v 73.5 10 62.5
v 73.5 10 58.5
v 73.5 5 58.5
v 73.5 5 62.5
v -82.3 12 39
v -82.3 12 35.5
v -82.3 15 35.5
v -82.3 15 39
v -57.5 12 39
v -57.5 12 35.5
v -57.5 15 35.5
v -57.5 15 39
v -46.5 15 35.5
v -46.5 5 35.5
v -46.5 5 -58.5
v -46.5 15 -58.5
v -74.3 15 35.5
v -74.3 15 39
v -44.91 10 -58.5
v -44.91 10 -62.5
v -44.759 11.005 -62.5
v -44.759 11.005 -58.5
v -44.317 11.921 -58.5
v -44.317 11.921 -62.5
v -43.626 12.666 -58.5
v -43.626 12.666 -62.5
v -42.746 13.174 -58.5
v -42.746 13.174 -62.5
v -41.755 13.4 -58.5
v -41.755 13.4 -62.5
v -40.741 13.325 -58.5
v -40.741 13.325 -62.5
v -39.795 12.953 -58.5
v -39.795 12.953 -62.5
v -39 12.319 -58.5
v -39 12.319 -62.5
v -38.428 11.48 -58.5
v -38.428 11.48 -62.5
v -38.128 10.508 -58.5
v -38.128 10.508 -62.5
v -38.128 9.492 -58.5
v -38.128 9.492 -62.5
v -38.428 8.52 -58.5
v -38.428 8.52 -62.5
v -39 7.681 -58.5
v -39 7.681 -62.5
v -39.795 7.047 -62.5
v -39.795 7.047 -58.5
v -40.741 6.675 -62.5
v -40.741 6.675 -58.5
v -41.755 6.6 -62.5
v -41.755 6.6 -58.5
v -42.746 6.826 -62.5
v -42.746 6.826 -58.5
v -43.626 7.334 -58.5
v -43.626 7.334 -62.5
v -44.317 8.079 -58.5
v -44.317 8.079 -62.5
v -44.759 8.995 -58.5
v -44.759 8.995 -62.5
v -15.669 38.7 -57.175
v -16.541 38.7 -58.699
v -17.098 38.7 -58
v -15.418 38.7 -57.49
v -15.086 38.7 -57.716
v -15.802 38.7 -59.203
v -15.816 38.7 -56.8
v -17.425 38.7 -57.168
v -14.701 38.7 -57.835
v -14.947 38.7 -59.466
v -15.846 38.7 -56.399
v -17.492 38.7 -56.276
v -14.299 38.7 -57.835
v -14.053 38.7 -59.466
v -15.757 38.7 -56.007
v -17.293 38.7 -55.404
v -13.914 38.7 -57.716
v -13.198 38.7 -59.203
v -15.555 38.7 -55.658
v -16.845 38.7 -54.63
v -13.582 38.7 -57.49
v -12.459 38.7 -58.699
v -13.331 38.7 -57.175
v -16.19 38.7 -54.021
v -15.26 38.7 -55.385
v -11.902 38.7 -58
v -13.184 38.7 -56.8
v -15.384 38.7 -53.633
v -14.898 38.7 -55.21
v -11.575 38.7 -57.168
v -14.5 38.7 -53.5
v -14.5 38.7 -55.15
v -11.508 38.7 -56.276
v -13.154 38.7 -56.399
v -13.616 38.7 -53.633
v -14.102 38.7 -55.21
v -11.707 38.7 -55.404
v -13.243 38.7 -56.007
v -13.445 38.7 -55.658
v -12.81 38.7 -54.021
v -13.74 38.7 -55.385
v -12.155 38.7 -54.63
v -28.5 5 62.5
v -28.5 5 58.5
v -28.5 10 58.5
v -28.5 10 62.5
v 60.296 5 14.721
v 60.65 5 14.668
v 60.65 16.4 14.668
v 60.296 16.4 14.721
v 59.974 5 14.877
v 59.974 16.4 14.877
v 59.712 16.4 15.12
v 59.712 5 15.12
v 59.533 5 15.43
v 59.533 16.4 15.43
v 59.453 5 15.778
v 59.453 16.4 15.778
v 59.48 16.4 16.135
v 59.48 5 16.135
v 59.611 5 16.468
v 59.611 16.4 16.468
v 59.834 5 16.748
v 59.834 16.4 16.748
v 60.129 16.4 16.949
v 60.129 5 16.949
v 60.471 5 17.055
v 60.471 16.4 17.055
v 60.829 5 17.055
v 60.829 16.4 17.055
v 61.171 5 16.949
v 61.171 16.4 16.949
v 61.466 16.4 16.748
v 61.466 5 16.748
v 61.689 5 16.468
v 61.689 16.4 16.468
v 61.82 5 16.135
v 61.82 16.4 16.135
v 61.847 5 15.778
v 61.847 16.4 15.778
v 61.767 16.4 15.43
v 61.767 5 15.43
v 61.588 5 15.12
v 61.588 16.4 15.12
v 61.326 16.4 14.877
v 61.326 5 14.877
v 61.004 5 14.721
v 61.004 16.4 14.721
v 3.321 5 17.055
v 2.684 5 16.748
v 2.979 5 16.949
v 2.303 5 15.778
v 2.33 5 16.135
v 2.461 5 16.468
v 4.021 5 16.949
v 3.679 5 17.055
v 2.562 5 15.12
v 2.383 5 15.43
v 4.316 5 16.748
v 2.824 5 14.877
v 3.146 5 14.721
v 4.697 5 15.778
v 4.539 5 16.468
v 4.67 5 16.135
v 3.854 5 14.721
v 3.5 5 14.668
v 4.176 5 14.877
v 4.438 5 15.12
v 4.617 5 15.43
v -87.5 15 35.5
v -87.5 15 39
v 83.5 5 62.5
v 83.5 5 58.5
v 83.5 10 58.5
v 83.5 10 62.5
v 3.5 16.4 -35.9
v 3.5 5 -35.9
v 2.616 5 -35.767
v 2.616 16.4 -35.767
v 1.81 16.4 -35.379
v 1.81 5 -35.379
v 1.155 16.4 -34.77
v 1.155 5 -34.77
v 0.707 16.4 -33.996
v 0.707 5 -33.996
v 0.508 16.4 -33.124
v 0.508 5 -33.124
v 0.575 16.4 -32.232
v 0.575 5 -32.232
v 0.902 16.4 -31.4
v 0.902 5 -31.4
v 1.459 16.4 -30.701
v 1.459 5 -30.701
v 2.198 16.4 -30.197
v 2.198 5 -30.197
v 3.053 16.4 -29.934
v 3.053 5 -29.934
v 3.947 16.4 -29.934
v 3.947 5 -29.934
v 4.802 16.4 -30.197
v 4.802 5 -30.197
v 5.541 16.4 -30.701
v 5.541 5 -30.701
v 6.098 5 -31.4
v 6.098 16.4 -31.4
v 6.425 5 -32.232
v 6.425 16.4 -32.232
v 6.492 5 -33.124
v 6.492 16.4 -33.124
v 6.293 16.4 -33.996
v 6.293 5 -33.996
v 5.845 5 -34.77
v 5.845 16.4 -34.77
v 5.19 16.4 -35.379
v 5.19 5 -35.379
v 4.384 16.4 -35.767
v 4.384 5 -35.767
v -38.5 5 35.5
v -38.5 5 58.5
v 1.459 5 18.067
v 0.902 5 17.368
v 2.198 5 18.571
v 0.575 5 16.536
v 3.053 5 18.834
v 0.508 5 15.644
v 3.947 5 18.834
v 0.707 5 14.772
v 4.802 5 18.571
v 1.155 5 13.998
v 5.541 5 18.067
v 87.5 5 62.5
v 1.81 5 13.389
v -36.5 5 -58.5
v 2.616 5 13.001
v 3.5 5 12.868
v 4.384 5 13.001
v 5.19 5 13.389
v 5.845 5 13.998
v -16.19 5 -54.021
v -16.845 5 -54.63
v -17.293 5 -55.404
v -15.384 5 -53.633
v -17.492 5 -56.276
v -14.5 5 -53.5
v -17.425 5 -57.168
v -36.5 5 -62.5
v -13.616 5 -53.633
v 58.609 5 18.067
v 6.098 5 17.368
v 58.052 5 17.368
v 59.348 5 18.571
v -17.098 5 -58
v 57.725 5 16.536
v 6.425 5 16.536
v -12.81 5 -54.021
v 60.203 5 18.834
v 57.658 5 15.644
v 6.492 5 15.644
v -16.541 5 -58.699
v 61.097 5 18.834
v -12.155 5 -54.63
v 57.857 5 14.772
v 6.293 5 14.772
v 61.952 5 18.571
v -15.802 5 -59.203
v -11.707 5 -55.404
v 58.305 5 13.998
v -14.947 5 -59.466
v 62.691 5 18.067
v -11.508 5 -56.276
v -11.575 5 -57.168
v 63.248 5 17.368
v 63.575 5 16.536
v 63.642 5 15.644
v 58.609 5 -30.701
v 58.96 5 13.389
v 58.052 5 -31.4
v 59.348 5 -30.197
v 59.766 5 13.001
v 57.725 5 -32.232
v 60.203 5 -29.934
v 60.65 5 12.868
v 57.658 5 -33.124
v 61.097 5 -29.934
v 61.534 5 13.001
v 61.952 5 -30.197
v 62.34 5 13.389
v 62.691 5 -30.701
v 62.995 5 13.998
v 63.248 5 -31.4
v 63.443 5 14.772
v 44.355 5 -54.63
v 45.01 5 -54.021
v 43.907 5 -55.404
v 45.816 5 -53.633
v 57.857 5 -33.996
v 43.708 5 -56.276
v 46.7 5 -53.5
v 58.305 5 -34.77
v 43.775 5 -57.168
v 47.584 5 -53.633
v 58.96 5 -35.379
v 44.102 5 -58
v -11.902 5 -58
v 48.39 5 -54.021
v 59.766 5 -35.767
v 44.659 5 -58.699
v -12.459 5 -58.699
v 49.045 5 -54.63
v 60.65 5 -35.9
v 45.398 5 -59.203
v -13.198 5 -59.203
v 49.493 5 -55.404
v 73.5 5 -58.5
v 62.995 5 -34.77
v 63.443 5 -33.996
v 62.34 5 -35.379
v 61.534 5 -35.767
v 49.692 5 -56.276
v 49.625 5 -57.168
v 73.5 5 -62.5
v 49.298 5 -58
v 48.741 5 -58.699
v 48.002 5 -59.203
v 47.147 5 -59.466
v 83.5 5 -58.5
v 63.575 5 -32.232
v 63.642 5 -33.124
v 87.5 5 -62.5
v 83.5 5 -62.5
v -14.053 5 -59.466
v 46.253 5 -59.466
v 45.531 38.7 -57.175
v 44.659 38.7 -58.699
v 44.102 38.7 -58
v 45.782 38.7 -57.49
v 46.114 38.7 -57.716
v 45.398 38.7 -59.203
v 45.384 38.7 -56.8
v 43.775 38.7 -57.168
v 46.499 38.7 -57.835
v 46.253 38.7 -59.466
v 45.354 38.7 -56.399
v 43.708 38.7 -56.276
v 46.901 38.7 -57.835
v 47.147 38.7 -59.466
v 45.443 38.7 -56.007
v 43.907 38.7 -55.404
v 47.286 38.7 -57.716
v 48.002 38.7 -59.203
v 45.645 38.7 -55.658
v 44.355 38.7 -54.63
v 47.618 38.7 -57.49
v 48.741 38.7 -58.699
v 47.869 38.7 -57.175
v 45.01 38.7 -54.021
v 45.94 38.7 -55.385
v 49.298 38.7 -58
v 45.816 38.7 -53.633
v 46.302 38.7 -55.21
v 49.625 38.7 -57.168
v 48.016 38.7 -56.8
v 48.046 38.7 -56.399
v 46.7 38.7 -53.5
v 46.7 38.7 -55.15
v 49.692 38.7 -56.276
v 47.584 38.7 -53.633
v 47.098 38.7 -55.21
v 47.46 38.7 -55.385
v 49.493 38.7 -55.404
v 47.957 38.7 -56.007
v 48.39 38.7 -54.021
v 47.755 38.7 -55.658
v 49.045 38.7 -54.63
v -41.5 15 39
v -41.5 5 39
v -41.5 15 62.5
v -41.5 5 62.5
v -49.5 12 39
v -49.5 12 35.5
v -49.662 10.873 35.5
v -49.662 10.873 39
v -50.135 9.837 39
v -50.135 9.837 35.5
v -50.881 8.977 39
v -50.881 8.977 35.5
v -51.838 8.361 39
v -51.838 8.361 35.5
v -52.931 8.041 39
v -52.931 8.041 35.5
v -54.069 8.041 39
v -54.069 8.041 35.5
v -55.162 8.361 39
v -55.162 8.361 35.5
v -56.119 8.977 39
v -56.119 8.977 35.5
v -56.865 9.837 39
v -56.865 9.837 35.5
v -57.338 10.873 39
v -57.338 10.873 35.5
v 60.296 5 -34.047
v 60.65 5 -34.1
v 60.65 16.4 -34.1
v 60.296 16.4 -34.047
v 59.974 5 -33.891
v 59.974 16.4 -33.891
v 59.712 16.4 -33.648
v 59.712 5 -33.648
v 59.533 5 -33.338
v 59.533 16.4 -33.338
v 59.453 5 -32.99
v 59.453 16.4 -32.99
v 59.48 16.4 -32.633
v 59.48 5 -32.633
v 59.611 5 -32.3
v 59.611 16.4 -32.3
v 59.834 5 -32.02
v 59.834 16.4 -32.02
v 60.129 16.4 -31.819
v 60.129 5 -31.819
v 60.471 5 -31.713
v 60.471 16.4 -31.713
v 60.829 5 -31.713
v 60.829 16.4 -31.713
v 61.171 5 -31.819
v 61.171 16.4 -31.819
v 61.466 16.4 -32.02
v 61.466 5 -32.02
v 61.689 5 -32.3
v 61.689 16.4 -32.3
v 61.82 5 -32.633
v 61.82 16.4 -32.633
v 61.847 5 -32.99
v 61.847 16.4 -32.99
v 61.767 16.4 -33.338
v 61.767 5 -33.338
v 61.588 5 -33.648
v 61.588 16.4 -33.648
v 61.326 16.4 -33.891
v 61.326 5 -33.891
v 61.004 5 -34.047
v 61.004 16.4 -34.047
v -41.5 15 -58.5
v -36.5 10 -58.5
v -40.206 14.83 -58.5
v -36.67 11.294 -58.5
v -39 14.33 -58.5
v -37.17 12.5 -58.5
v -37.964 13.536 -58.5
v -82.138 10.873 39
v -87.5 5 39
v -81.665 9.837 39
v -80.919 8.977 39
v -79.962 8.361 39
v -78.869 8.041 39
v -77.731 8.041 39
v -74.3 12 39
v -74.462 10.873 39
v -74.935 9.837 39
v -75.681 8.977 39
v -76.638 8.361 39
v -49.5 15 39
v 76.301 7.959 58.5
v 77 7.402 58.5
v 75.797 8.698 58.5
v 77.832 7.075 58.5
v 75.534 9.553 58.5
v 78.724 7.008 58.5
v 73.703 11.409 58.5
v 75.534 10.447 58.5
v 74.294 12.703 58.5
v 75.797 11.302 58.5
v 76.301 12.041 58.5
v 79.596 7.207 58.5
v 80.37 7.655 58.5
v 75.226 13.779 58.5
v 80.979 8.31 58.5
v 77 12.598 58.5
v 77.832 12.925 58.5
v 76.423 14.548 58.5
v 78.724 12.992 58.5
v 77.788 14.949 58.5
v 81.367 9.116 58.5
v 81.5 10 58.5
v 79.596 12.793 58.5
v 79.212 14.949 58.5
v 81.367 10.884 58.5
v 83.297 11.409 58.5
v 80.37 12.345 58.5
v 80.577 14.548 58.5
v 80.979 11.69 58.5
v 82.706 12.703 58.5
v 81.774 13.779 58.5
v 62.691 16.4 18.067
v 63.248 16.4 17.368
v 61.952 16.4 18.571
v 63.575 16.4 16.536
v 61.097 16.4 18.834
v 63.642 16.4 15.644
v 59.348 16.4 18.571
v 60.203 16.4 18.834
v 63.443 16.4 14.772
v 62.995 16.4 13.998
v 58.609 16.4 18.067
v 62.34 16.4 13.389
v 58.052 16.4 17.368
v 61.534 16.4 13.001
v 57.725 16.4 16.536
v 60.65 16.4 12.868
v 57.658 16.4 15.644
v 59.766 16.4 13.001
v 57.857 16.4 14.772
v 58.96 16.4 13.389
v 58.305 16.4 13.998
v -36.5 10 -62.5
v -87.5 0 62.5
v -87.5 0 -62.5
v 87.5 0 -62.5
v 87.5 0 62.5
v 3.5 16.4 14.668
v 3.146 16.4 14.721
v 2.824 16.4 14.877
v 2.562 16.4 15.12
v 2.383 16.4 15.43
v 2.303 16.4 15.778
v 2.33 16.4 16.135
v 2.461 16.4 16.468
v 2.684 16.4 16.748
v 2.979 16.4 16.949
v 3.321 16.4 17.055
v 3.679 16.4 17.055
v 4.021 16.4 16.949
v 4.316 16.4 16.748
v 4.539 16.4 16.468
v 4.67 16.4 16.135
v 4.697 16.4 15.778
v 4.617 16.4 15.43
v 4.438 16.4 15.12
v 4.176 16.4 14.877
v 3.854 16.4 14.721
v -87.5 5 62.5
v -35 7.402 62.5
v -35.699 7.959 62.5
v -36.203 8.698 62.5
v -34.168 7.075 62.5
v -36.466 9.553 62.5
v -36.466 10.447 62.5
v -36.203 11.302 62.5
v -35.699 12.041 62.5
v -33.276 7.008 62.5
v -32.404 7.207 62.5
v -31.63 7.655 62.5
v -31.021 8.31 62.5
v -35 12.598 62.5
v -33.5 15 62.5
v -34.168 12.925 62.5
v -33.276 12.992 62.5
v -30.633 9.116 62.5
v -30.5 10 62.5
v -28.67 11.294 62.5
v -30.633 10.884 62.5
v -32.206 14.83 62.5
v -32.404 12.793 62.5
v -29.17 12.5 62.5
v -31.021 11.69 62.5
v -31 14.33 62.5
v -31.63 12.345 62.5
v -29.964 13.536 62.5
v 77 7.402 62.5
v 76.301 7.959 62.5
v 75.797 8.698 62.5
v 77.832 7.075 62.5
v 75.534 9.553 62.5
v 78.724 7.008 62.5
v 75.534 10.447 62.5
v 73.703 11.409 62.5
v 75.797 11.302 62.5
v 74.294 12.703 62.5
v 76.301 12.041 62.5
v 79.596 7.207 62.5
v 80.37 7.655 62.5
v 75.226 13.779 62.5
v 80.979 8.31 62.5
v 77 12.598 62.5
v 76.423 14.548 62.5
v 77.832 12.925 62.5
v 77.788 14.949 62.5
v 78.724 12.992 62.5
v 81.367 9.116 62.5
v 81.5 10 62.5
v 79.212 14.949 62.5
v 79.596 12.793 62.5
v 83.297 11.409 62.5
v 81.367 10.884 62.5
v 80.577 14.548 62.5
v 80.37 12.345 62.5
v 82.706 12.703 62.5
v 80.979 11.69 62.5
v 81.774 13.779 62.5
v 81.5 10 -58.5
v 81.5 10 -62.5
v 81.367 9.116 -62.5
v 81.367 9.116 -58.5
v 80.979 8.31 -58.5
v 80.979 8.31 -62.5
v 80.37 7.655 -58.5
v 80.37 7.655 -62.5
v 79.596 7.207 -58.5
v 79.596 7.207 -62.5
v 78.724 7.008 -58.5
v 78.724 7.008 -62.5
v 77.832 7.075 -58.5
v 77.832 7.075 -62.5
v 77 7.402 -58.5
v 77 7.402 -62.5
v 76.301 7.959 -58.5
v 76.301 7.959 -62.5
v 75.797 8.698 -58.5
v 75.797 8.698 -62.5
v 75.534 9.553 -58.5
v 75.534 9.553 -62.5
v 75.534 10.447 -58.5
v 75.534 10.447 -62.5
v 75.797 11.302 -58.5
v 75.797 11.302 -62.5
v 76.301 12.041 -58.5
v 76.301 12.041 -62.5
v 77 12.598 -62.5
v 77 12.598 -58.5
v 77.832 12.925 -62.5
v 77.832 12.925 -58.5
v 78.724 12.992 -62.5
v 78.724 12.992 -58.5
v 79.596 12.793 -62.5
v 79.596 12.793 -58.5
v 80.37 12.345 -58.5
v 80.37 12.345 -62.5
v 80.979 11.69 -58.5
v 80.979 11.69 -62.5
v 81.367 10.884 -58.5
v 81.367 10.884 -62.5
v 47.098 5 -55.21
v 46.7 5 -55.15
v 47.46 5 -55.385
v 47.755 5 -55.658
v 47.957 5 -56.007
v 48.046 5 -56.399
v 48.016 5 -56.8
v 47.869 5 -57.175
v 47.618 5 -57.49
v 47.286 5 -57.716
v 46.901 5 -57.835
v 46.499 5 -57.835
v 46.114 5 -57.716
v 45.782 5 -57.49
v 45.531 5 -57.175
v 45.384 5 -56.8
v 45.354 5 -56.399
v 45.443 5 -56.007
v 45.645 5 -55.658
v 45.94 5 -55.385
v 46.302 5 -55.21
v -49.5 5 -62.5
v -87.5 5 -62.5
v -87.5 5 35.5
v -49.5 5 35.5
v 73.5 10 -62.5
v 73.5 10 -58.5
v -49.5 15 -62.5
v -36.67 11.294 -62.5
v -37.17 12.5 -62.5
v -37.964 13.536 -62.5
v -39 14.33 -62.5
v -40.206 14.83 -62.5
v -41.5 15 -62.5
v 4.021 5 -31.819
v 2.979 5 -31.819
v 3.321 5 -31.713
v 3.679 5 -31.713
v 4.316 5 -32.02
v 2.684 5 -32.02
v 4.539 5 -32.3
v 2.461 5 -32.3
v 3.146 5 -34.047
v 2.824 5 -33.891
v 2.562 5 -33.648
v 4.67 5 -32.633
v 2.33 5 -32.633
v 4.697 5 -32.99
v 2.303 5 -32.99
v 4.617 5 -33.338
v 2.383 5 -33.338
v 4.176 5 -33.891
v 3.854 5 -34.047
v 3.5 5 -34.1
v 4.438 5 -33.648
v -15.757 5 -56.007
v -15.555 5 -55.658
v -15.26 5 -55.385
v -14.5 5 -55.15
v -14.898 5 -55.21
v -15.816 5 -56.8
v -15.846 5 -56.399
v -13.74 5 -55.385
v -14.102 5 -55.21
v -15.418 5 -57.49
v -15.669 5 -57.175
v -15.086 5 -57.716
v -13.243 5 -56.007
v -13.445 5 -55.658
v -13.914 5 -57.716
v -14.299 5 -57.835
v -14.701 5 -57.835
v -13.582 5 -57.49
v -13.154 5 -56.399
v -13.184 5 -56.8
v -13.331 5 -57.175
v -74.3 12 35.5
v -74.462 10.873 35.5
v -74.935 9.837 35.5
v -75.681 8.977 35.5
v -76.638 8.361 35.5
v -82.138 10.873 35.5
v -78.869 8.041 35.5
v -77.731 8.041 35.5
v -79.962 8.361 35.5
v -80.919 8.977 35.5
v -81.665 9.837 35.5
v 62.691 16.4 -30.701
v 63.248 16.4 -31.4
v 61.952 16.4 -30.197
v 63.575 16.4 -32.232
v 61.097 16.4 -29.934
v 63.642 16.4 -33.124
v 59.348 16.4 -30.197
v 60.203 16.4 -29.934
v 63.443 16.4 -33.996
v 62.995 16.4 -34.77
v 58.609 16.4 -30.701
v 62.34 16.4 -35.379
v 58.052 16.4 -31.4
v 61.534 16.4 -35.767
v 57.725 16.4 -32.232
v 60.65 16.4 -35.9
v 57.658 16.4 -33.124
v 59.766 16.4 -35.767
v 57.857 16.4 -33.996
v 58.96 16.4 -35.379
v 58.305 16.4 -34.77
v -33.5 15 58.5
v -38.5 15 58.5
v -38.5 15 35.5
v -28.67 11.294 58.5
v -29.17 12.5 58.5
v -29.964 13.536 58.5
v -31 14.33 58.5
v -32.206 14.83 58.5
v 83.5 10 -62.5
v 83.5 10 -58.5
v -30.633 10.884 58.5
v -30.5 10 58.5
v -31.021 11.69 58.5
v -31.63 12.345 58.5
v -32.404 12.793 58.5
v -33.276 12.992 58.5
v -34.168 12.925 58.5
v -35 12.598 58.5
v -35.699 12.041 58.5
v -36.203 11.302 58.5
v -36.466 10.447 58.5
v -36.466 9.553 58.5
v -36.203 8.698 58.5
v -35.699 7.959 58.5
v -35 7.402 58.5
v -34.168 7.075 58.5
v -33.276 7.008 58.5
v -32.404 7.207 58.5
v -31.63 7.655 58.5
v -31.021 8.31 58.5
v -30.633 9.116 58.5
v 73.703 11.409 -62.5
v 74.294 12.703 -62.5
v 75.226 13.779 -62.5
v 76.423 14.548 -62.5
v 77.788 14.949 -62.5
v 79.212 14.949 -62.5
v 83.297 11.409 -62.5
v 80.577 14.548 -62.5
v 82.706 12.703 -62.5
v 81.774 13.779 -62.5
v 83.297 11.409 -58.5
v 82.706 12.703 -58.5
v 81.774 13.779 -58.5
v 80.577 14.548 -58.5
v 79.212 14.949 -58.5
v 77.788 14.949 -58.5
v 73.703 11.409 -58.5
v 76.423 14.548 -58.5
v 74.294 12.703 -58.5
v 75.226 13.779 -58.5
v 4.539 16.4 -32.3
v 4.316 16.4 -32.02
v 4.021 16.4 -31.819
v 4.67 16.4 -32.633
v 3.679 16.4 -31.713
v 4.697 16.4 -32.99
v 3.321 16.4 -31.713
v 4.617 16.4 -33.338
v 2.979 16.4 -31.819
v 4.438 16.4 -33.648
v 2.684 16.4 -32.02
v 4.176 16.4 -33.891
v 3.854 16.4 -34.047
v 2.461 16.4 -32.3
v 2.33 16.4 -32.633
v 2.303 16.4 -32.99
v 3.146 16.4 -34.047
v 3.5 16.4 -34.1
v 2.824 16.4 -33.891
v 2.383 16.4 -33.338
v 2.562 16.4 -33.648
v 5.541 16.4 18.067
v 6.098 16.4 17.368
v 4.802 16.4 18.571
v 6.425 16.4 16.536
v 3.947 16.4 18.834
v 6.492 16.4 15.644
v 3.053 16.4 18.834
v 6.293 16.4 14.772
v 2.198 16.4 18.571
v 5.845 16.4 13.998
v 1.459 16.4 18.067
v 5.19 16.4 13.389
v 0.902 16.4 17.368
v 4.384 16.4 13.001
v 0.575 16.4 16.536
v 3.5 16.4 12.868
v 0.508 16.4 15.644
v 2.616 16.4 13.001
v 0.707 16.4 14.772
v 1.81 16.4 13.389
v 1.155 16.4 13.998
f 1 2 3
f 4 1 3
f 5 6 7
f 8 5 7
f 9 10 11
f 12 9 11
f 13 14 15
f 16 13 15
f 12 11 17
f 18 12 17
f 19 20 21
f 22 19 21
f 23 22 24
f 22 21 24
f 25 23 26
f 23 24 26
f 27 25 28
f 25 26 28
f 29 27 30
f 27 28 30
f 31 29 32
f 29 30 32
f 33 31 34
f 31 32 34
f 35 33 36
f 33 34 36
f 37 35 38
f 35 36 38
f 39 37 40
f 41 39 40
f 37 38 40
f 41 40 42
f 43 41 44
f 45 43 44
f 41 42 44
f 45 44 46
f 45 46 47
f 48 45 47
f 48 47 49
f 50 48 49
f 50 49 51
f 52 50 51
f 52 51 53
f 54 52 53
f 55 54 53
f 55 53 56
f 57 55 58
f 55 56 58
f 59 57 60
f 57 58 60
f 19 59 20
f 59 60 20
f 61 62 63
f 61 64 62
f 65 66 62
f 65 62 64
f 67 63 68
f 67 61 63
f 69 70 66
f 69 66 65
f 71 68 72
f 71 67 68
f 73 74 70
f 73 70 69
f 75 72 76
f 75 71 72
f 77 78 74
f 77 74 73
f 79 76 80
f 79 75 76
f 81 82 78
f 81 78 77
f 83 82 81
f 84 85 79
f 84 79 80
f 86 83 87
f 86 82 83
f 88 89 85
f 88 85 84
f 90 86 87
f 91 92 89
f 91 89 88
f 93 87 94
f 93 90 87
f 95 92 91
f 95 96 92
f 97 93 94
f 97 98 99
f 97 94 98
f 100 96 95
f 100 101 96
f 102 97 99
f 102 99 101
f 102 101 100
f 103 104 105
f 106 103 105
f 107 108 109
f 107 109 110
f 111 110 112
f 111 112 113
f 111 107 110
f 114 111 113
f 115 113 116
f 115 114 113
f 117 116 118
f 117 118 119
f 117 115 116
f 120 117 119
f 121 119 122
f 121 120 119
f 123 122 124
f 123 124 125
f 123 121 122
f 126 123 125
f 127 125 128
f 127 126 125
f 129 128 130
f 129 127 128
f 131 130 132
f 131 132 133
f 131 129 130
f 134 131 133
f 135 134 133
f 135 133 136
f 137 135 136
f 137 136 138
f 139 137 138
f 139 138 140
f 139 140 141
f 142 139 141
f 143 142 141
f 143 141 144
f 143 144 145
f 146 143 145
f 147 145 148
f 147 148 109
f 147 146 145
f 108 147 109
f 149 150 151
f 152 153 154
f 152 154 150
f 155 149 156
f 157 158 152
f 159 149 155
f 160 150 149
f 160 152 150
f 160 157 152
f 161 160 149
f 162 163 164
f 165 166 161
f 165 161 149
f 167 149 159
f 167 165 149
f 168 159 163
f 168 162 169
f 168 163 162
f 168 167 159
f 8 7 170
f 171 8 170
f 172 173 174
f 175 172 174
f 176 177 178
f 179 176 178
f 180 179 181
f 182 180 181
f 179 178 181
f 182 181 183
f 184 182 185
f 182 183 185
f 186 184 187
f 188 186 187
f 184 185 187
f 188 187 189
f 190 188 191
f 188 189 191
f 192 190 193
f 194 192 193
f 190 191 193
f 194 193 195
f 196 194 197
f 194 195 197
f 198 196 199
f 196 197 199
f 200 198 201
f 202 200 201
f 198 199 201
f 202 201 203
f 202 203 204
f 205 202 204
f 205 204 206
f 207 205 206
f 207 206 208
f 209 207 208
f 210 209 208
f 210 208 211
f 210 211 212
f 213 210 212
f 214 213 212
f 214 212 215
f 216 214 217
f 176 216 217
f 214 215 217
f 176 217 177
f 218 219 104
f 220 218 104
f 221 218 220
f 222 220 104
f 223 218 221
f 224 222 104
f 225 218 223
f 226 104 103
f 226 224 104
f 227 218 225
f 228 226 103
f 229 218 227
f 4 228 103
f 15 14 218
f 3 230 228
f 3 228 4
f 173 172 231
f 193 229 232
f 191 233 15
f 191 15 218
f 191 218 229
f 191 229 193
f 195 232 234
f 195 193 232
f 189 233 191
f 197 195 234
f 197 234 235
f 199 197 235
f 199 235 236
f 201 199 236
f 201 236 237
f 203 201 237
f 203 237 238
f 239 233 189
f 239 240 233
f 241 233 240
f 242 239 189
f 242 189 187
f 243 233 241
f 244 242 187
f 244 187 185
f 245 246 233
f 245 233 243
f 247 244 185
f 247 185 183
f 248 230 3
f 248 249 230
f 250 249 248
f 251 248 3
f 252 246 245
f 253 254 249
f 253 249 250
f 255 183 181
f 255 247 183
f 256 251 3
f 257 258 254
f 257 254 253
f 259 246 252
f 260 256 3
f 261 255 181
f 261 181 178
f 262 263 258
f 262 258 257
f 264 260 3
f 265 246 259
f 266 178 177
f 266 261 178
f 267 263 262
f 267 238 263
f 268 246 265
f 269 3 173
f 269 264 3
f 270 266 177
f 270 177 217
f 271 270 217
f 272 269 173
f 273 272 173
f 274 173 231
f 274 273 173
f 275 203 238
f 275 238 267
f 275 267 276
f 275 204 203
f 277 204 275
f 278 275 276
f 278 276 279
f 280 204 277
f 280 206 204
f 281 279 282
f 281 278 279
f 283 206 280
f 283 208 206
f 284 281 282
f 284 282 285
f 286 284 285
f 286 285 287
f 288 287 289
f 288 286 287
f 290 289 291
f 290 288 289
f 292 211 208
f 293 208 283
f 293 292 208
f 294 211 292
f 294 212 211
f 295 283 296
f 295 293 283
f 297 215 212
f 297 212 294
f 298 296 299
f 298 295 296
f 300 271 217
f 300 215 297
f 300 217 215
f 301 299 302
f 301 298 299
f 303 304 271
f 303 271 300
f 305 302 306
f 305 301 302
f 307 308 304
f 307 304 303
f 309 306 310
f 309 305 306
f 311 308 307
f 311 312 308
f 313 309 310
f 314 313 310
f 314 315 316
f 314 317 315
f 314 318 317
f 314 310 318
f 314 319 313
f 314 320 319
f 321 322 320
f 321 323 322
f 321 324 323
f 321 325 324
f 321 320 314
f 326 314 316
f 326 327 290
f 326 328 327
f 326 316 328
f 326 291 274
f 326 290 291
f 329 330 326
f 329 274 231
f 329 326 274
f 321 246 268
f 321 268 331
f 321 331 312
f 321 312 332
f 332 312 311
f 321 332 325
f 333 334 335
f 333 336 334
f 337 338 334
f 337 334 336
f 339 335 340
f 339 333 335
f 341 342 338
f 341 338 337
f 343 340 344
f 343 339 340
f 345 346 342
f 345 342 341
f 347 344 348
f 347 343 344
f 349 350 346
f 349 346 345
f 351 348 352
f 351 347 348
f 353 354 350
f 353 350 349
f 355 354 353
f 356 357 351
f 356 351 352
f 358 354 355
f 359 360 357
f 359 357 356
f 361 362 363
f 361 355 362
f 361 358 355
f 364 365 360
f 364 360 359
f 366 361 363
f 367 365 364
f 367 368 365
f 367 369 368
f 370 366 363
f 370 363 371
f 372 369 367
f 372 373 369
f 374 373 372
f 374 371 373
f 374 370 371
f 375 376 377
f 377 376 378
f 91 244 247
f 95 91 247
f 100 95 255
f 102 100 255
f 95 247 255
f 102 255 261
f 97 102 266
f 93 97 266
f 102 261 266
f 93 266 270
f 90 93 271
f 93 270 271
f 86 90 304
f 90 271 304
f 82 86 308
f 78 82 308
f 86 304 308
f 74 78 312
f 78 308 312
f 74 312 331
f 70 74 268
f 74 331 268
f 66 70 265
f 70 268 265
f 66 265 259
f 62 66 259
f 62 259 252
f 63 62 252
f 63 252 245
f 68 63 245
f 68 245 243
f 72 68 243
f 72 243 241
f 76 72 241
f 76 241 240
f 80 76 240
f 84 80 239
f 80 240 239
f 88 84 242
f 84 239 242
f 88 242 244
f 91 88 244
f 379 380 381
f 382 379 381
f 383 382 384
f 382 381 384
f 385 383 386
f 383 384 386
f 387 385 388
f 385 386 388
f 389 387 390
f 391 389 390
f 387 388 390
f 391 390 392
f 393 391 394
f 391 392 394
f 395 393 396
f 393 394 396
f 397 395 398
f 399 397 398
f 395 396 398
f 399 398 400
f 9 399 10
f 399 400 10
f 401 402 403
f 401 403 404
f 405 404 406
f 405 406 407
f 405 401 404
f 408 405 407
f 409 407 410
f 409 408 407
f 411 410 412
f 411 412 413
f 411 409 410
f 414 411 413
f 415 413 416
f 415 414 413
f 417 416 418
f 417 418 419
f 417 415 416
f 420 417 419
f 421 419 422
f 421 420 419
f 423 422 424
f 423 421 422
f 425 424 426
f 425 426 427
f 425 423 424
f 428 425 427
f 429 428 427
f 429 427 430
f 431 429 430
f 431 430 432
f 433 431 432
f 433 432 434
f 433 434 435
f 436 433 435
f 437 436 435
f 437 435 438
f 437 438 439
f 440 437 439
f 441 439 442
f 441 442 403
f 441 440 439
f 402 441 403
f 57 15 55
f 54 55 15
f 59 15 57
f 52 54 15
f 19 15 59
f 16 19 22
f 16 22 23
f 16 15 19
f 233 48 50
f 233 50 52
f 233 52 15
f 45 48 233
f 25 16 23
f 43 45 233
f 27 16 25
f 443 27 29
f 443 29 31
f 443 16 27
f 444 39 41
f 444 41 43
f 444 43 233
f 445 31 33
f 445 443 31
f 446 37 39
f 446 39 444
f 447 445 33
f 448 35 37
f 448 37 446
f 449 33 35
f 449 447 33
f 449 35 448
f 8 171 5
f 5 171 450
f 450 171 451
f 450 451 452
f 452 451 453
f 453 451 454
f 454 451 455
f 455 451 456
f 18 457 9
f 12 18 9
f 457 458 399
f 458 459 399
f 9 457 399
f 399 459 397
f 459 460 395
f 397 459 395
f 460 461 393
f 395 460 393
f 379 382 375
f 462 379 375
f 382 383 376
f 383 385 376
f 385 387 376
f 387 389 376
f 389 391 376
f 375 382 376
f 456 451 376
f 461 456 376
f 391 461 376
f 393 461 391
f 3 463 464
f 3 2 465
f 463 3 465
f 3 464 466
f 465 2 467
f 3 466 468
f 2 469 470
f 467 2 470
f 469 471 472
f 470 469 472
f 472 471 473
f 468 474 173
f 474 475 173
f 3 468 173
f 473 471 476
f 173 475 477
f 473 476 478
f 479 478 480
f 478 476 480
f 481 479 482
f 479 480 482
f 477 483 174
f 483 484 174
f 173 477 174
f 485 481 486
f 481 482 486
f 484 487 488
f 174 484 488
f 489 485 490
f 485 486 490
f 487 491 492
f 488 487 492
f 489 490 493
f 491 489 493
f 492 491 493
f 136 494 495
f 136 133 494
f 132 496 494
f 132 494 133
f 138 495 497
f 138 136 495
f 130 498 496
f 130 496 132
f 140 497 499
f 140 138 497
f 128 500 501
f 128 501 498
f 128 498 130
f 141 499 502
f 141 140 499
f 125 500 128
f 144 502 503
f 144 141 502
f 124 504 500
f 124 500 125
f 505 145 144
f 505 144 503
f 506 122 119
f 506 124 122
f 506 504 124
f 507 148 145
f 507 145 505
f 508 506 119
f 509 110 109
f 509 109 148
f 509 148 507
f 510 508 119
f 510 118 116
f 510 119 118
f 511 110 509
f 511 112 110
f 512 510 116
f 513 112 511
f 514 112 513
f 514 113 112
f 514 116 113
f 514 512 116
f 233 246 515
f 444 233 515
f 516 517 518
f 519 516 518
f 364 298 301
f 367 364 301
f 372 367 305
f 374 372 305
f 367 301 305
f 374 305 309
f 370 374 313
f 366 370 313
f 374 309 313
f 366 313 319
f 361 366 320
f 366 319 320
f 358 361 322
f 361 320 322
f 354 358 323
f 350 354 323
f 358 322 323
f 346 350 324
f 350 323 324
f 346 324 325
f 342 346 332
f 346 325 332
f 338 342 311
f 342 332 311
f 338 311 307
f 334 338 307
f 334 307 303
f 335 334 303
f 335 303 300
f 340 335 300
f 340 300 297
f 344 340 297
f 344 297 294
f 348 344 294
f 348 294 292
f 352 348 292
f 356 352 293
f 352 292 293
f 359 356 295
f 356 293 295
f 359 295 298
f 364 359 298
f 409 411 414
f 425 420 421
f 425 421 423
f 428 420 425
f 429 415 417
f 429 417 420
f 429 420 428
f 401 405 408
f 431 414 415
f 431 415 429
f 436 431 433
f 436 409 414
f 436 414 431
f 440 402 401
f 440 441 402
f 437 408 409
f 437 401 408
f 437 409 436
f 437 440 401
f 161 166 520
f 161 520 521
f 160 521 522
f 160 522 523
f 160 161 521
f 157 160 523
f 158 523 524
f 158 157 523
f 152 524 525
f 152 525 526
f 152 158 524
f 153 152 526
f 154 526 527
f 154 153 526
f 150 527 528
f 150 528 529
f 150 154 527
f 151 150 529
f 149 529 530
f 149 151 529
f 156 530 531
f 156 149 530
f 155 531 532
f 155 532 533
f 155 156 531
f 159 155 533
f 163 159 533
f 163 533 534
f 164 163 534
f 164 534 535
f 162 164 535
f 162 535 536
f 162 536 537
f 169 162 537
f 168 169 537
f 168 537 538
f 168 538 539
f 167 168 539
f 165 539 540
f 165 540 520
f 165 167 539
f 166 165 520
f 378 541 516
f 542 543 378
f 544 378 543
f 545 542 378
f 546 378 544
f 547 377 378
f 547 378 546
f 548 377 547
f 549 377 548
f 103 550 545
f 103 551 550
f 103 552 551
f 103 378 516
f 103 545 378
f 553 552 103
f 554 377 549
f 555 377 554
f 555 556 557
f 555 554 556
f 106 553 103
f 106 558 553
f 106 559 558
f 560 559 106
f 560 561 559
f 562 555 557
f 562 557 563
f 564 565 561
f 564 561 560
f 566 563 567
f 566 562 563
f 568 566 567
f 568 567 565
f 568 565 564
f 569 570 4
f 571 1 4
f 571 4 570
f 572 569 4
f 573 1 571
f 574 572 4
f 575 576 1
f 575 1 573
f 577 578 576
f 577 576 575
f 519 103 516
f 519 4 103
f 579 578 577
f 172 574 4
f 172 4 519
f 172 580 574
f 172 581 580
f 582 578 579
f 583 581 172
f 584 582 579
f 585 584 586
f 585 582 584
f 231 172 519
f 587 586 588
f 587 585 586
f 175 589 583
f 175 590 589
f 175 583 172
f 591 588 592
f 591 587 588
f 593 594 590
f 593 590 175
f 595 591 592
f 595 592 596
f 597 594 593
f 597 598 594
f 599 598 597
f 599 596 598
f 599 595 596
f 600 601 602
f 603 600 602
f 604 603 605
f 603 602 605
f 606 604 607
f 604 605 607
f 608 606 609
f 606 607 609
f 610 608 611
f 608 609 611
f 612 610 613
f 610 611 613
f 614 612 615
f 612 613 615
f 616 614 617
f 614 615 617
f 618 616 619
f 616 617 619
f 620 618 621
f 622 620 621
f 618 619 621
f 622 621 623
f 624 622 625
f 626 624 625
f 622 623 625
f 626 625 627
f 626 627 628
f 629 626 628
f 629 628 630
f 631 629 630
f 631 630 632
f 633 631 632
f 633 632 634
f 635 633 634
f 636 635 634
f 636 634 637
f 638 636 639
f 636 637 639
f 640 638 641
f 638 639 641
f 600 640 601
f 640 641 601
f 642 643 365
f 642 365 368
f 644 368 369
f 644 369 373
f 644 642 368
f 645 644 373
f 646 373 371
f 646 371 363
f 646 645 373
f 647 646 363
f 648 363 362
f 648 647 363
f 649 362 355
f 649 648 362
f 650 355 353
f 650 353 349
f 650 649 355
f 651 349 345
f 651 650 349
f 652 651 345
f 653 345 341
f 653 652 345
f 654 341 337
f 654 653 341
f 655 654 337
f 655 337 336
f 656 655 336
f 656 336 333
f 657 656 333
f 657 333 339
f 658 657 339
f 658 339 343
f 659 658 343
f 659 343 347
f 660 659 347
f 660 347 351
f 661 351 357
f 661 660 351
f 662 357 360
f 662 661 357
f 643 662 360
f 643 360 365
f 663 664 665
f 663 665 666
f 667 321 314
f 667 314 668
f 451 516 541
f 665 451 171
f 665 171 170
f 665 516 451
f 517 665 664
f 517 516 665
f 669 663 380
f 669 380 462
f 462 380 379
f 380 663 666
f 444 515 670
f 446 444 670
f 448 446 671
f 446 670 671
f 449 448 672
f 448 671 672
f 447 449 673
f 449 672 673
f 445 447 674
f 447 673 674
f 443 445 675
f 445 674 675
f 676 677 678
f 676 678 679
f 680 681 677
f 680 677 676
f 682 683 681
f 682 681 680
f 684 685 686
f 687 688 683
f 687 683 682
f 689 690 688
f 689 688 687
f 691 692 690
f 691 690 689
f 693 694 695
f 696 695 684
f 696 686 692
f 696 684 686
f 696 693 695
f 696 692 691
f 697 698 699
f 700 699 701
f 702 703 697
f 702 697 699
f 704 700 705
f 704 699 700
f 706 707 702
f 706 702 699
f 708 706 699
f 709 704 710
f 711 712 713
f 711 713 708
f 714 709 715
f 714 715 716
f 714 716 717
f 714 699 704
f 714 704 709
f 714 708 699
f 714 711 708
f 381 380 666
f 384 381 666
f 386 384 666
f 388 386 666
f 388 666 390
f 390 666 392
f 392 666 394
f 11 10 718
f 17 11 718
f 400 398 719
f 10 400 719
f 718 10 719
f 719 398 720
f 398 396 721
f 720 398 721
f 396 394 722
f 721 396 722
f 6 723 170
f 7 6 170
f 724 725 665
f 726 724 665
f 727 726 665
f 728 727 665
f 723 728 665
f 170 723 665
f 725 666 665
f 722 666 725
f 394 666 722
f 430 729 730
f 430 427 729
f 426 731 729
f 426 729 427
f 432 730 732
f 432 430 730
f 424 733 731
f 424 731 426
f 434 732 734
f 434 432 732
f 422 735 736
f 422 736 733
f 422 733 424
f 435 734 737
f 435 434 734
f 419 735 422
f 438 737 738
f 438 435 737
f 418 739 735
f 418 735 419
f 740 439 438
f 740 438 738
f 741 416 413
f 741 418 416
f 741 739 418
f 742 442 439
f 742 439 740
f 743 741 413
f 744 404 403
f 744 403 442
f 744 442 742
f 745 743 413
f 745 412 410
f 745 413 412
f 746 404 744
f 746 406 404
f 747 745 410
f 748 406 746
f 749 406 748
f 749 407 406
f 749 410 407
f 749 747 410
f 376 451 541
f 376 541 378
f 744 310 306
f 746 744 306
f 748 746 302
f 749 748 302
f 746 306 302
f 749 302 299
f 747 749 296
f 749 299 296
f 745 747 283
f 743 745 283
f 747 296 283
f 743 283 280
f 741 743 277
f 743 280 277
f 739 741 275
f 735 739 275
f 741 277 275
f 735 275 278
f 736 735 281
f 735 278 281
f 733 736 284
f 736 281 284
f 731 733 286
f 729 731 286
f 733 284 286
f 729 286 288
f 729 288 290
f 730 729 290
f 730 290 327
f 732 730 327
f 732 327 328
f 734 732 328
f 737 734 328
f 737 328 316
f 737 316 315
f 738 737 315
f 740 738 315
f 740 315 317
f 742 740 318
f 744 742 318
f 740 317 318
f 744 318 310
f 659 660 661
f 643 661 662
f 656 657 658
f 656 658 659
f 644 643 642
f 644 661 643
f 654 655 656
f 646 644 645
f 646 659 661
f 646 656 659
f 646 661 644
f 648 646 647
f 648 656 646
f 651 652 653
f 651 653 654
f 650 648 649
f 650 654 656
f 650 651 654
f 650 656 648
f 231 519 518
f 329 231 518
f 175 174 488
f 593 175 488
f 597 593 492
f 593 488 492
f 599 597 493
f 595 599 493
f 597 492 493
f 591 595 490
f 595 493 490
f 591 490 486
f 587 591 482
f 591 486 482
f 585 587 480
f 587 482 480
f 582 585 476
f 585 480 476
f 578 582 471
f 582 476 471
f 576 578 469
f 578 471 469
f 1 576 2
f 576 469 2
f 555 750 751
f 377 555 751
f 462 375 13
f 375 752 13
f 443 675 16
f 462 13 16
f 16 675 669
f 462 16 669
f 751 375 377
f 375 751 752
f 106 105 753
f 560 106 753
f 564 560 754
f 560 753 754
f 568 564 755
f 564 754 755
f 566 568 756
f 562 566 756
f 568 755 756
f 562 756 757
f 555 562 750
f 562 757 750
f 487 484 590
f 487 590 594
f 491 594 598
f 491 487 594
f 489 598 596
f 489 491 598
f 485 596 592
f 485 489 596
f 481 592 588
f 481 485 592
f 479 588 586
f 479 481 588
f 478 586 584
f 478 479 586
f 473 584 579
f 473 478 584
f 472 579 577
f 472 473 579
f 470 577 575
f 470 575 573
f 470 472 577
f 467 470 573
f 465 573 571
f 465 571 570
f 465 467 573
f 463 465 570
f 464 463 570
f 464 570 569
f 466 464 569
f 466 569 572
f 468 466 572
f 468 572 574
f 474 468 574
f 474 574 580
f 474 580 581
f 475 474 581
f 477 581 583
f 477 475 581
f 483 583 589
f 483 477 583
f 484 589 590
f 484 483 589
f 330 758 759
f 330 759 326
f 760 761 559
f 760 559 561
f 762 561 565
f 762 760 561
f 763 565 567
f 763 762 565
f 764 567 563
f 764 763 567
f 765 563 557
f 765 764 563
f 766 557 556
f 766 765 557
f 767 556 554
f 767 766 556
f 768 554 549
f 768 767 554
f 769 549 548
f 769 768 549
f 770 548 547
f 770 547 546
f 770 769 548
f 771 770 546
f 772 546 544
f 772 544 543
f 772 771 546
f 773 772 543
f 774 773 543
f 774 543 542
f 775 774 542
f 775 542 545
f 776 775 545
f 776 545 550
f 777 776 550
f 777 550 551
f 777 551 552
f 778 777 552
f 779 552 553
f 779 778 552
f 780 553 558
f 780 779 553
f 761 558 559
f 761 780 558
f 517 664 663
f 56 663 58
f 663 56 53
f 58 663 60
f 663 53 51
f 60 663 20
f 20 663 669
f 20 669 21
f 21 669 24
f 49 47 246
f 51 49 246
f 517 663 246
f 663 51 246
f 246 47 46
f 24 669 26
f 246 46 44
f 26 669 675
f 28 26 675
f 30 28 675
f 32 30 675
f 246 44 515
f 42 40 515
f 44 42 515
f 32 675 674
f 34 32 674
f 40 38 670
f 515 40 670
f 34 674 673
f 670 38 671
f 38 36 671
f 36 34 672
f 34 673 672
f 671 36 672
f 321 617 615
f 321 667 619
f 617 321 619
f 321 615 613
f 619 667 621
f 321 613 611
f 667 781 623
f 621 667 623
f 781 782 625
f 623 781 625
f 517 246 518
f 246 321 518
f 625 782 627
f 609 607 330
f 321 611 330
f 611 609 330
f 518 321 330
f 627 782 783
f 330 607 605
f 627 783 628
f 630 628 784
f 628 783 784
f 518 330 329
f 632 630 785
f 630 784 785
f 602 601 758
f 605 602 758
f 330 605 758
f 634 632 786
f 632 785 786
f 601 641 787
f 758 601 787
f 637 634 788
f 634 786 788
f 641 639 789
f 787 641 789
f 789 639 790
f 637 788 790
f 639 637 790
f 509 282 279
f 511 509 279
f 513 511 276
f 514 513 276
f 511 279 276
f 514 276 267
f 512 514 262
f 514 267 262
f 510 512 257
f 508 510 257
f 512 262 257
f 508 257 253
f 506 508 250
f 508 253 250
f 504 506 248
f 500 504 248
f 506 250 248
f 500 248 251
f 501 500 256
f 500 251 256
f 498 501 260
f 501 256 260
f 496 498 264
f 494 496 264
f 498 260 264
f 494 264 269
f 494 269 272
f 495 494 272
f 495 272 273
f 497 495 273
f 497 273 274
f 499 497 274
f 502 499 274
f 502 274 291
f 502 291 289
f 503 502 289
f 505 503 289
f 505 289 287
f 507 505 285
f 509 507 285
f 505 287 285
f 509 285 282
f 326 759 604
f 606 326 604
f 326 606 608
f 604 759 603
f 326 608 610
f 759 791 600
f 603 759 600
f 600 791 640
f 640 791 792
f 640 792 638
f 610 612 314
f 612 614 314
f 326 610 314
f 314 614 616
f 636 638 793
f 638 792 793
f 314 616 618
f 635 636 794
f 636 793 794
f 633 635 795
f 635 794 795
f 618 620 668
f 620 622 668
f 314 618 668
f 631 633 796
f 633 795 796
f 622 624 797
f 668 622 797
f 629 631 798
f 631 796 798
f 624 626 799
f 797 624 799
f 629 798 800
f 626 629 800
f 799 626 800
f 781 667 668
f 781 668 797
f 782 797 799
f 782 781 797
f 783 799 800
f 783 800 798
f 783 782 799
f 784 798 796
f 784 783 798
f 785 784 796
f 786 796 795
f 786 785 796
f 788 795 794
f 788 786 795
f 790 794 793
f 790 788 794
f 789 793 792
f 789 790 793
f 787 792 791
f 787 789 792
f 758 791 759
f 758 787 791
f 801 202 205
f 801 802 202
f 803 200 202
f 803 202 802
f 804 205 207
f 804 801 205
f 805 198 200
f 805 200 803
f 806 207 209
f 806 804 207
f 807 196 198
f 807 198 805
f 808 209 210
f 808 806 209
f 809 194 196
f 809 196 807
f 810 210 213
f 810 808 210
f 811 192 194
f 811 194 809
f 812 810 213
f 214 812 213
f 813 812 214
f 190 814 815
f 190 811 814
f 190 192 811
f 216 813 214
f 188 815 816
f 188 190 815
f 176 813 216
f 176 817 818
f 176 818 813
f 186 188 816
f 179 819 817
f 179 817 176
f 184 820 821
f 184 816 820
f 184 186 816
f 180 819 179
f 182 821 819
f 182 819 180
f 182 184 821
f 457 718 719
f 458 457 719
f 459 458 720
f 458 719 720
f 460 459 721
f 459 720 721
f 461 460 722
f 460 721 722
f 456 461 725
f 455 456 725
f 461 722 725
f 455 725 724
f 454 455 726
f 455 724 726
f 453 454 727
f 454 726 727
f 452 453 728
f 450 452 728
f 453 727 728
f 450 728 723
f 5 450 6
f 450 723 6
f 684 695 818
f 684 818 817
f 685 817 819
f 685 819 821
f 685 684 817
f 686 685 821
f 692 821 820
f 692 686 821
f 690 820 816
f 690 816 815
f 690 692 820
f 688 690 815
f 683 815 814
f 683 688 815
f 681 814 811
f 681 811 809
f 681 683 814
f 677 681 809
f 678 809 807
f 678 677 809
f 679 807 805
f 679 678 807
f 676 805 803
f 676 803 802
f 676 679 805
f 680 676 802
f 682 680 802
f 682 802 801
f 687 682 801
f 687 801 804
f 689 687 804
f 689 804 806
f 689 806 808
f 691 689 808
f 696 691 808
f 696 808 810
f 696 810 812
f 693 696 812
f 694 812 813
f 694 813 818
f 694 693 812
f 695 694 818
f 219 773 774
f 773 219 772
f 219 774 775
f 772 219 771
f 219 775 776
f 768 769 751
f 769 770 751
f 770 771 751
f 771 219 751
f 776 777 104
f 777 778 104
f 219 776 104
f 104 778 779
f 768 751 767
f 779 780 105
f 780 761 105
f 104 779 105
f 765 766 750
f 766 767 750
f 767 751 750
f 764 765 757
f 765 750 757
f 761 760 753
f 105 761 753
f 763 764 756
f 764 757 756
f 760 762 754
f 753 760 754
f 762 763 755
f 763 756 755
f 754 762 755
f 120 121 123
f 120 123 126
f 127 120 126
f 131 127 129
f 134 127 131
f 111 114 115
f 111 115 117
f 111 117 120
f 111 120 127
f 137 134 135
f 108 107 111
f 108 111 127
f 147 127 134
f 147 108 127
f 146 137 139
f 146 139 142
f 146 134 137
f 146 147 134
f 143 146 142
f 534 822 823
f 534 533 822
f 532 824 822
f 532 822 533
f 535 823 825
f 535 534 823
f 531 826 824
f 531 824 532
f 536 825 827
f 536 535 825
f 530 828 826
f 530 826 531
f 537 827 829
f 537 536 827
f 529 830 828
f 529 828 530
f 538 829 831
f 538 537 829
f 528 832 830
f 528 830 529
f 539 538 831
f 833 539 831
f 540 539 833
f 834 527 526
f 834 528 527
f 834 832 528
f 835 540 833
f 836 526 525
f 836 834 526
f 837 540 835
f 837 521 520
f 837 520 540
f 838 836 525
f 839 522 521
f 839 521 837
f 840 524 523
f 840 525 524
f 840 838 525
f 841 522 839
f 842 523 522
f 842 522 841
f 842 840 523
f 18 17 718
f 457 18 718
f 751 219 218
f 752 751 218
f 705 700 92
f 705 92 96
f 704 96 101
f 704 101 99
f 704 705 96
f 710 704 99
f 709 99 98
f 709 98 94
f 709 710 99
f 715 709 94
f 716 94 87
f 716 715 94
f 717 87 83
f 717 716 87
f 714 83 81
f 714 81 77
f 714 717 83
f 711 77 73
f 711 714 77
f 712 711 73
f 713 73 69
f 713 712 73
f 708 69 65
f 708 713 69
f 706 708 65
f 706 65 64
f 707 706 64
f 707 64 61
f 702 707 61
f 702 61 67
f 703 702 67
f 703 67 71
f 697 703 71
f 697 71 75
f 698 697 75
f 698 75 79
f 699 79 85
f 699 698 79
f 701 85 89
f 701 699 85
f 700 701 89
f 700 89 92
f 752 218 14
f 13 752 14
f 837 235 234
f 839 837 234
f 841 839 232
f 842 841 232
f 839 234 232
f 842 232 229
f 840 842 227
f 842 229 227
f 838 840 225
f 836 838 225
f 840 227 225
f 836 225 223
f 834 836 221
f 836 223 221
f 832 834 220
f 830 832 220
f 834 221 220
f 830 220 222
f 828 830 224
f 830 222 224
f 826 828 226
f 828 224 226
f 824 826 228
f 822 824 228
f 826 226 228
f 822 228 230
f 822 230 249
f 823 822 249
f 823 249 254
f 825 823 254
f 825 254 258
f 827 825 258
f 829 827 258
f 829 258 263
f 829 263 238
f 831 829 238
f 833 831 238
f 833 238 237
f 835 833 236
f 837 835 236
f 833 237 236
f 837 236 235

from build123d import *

# Parameters (mm, degrees)
SKETCH1_W           = 175
SKETCH1_H           = 125
BOSS_EXTRUDE1_DEPTH = 5
BOSS_EXTRUDE2_DEPTH = 10
SKETCH3_R           = 3.41
SKETCH3_R_2         = 3
BOSS_EXTRUDE3_DEPTH = 4
BOSS_EXTRUDE4_START = -4
SKETCH4_R           = 3
BOSS_EXTRUDE4_DEPTH = 4
SKETCH5_R           = 3
SKETCH5_R_2         = 1.2
BOSS_EXTRUDE5_DEPTH = 11.4
SKETCH6_R           = 3
SKETCH6_R_2         = 1.35
BOSS_EXTRUDE6_DEPTH = 33.7
CUT_EXTRUDE1_REACH  = 138.96


with BuildPart() as part:
    # Sketch1 → Boss-Extrude1 (new body)
    with BuildSketch(Plane(origin=(0, 0, 0), x_dir=(1, 0, 0), z_dir=(0, 1, 0))):
        Rectangle(SKETCH1_W, SKETCH1_H)
    extrude(amount=BOSS_EXTRUDE1_DEPTH)

    # Sketch2 → Boss-Extrude2 (add)
    with BuildSketch(Plane(origin=(0, 5, 0), x_dir=(1, 0, 0), z_dir=(0, 1, 0))):
        Polygon((-49.5, 62.5), (-49.5, -35.5), (-87.5, -35.5), (-87.5, -39), (-41.5, -39), (-41.5, -62.5), (-38.5, -62.5), (-38.5, -35.5), (-46.5, -35.5), (-46.5, 62.5), align=None)
    extrude(amount=BOSS_EXTRUDE2_DEPTH)

    # Sketch3 → Boss-Extrude3 (add)
    # profile 1 of 2: a face of its own
    with BuildSketch(Plane(origin=(0, 0, -62.5), x_dir=(-1, 0, 0), z_dir=(0, 0, -1))):
        with BuildLine():
            Line((46.5, 5), (36.5, 5))
            Line((36.5, 5), (36.5, 10))
            ThreePointArc((36.5, 10), (37.964466094, 13.535533906), (41.5, 15))
            Line((41.5, 15), (46.5, 15))
            Line((46.5, 15), (46.5, 5))
        make_face()
        with Locations((41.5, 10)):
            Circle(SKETCH3_R, mode=Mode.SUBTRACT)
    # profile 2 of 2: a face of its own
    with BuildSketch(Plane(origin=(0, 0, -62.5), x_dir=(-1, 0, 0), z_dir=(0, 0, -1))):
        with BuildLine():
            Line((-83.5, 10), (-83.5, 5))
            Line((-83.5, 5), (-73.5, 5))
            Line((-73.5, 5), (-73.5, 10))
            ThreePointArc((-73.5, 10), (-78.5, 15), (-83.5, 10))
        make_face()
        with Locations(Location((-78.5, 10, 0), (0, 0, 180))):
            Circle(SKETCH3_R_2, mode=Mode.SUBTRACT)
    extrude(amount=-BOSS_EXTRUDE3_DEPTH)

    # Sketch4 → Boss-Extrude4 (add)
    # profile 1 of 2: a face of its own
    with BuildSketch(Plane.XY.offset(62.5).offset(BOSS_EXTRUDE4_START)):
        with BuildLine():
            Line((73.5, 5), (83.5, 5))
            Line((83.5, 5), (83.5, 10))
            ThreePointArc((83.5, 10), (78.5, 15), (73.5, 10))
            Line((73.5, 10), (73.5, 5))
        make_face()
        with Locations((78.5, 10)):
            Circle(SKETCH4_R, mode=Mode.SUBTRACT)
    # profile 2 of 2: a face of its own
    with BuildSketch(Plane.XY.offset(62.5).offset(BOSS_EXTRUDE4_START)):
        with BuildLine():
            Line((-38.5, 15), (-38.5, 5))
            Line((-38.5, 5), (-28.5, 5))
            Line((-28.5, 5), (-28.5, 10))
            ThreePointArc((-28.5, 10), (-29.964466094, 13.535533906), (-33.5, 15))
            Line((-33.5, 15), (-38.5, 15))
        make_face()
        with Locations((-33.5, 10)):
            Circle(SKETCH4_R, mode=Mode.SUBTRACT)
    extrude(amount=BOSS_EXTRUDE4_DEPTH)

    # Sketch5 → Boss-Extrude5 (add)
    # profile 1 of 4: a face of its own
    with BuildSketch(Plane(origin=(0, 5, 0), x_dir=(1, 0, 0), z_dir=(0, 1, 0))):
        with Locations(Location((3.5, 32.9, 0), (0, 0, 90))):
            Circle(SKETCH5_R)
        with Locations(Location((3.5, 32.9, 0), (0, 0, 90))):
            Circle(SKETCH5_R_2, mode=Mode.SUBTRACT)
    # profile 2 of 4: a face of its own
    with BuildSketch(Plane(origin=(0, 5, 0), x_dir=(1, 0, 0), z_dir=(0, 1, 0))):
        with Locations(Location((60.65, 32.9, 0), (0, 0, 90))):
            Circle(SKETCH5_R)
        with Locations(Location((60.65, 32.9, 0), (0, 0, 90))):
            Circle(SKETCH5_R_2, mode=Mode.SUBTRACT)
    # profile 3 of 4: a face of its own
    with BuildSketch(Plane(origin=(0, 5, 0), x_dir=(1, 0, 0), z_dir=(0, 1, 0))):
        with Locations(Location((60.65, -15.868, 0), (0, 0, 90))):
            Circle(SKETCH5_R)
        with Locations(Location((60.65, -15.868, 0), (0, 0, 90))):
            Circle(SKETCH5_R_2, mode=Mode.SUBTRACT)
    # profile 4 of 4: a face of its own
    with BuildSketch(Plane(origin=(0, 5, 0), x_dir=(1, 0, 0), z_dir=(0, 1, 0))):
        with Locations(Location((3.5, -15.868, 0), (0, 0, 90))):
            Circle(SKETCH5_R)
        with Locations(Location((3.5, -15.868, 0), (0, 0, 90))):
            Circle(SKETCH5_R_2, mode=Mode.SUBTRACT)
    extrude(amount=BOSS_EXTRUDE5_DEPTH)

    # Sketch6 → Boss-Extrude6 (add)
    # profile 1 of 2: a face of its own
    with BuildSketch(Plane(origin=(0, 5, 0), x_dir=(1, 0, 0), z_dir=(0, 1, 0))):
        with Locations(Location((46.7, 56.5, 0), (0, 0, 270))):
            Circle(SKETCH6_R)
        with Locations(Location((46.7, 56.5, 0), (0, 0, 270))):
            Circle(SKETCH6_R_2, mode=Mode.SUBTRACT)
    # profile 2 of 2: a face of its own
    with BuildSketch(Plane(origin=(0, 5, 0), x_dir=(1, 0, 0), z_dir=(0, 1, 0))):
        with Locations(Location((-14.5, 56.5, 0), (0, 0, 270))):
            Circle(SKETCH6_R)
        with Locations(Location((-14.5, 56.5, 0), (0, 0, 270))):
            Circle(SKETCH6_R_2, mode=Mode.SUBTRACT)
    extrude(amount=BOSS_EXTRUDE6_DEPTH)

    # Sketch7 → Cut-Extrude1 (cut, up to next)
    with BuildSketch(Plane(origin=(0, 0, 35.5), x_dir=(-1, 0, 0), z_dir=(0, 0, -1)), mode=Mode.PRIVATE) as cut_extrude1_sk1:
        with BuildLine():
            Line((49.5, 15), (49.5, 12))
            ThreePointArc((49.5, 12), (53.5, 8), (57.5, 12))
            Line((57.5, 12), (57.5, 15))
            Line((57.5, 15), (49.5, 15))
        make_face()
    cut_extrude1_tool1 = extrude(cut_extrude1_sk1.sketch, amount=-CUT_EXTRUDE1_REACH, mode=Mode.PRIVATE) & part.part
    # Sketch7 → Cut-Extrude1 (cut, up to next)
    with BuildSketch(Plane(origin=(0, 0, 35.5), x_dir=(-1, 0, 0), z_dir=(0, 0, -1)), mode=Mode.PRIVATE) as cut_extrude1_sk2:
        with BuildLine():
            Line((74.3, 15), (74.3, 12))
            ThreePointArc((74.3, 12), (78.3, 8), (82.3, 12))
            Line((82.3, 12), (82.3, 15))
            Line((82.3, 15), (74.3, 15))
        make_face()
    cut_extrude1_tool2 = extrude(cut_extrude1_sk2.sketch, amount=-CUT_EXTRUDE1_REACH, mode=Mode.PRIVATE) & part.part
    add(cut_extrude1_tool1.solids().sort_by_distance((-53.5, 11.864313, 35.5))[0], mode=Mode.SUBTRACT)
    add(cut_extrude1_tool2.solids().sort_by_distance((-78.3, 11.864313, 35.5))[0], mode=Mode.SUBTRACT)


solid = part.part
